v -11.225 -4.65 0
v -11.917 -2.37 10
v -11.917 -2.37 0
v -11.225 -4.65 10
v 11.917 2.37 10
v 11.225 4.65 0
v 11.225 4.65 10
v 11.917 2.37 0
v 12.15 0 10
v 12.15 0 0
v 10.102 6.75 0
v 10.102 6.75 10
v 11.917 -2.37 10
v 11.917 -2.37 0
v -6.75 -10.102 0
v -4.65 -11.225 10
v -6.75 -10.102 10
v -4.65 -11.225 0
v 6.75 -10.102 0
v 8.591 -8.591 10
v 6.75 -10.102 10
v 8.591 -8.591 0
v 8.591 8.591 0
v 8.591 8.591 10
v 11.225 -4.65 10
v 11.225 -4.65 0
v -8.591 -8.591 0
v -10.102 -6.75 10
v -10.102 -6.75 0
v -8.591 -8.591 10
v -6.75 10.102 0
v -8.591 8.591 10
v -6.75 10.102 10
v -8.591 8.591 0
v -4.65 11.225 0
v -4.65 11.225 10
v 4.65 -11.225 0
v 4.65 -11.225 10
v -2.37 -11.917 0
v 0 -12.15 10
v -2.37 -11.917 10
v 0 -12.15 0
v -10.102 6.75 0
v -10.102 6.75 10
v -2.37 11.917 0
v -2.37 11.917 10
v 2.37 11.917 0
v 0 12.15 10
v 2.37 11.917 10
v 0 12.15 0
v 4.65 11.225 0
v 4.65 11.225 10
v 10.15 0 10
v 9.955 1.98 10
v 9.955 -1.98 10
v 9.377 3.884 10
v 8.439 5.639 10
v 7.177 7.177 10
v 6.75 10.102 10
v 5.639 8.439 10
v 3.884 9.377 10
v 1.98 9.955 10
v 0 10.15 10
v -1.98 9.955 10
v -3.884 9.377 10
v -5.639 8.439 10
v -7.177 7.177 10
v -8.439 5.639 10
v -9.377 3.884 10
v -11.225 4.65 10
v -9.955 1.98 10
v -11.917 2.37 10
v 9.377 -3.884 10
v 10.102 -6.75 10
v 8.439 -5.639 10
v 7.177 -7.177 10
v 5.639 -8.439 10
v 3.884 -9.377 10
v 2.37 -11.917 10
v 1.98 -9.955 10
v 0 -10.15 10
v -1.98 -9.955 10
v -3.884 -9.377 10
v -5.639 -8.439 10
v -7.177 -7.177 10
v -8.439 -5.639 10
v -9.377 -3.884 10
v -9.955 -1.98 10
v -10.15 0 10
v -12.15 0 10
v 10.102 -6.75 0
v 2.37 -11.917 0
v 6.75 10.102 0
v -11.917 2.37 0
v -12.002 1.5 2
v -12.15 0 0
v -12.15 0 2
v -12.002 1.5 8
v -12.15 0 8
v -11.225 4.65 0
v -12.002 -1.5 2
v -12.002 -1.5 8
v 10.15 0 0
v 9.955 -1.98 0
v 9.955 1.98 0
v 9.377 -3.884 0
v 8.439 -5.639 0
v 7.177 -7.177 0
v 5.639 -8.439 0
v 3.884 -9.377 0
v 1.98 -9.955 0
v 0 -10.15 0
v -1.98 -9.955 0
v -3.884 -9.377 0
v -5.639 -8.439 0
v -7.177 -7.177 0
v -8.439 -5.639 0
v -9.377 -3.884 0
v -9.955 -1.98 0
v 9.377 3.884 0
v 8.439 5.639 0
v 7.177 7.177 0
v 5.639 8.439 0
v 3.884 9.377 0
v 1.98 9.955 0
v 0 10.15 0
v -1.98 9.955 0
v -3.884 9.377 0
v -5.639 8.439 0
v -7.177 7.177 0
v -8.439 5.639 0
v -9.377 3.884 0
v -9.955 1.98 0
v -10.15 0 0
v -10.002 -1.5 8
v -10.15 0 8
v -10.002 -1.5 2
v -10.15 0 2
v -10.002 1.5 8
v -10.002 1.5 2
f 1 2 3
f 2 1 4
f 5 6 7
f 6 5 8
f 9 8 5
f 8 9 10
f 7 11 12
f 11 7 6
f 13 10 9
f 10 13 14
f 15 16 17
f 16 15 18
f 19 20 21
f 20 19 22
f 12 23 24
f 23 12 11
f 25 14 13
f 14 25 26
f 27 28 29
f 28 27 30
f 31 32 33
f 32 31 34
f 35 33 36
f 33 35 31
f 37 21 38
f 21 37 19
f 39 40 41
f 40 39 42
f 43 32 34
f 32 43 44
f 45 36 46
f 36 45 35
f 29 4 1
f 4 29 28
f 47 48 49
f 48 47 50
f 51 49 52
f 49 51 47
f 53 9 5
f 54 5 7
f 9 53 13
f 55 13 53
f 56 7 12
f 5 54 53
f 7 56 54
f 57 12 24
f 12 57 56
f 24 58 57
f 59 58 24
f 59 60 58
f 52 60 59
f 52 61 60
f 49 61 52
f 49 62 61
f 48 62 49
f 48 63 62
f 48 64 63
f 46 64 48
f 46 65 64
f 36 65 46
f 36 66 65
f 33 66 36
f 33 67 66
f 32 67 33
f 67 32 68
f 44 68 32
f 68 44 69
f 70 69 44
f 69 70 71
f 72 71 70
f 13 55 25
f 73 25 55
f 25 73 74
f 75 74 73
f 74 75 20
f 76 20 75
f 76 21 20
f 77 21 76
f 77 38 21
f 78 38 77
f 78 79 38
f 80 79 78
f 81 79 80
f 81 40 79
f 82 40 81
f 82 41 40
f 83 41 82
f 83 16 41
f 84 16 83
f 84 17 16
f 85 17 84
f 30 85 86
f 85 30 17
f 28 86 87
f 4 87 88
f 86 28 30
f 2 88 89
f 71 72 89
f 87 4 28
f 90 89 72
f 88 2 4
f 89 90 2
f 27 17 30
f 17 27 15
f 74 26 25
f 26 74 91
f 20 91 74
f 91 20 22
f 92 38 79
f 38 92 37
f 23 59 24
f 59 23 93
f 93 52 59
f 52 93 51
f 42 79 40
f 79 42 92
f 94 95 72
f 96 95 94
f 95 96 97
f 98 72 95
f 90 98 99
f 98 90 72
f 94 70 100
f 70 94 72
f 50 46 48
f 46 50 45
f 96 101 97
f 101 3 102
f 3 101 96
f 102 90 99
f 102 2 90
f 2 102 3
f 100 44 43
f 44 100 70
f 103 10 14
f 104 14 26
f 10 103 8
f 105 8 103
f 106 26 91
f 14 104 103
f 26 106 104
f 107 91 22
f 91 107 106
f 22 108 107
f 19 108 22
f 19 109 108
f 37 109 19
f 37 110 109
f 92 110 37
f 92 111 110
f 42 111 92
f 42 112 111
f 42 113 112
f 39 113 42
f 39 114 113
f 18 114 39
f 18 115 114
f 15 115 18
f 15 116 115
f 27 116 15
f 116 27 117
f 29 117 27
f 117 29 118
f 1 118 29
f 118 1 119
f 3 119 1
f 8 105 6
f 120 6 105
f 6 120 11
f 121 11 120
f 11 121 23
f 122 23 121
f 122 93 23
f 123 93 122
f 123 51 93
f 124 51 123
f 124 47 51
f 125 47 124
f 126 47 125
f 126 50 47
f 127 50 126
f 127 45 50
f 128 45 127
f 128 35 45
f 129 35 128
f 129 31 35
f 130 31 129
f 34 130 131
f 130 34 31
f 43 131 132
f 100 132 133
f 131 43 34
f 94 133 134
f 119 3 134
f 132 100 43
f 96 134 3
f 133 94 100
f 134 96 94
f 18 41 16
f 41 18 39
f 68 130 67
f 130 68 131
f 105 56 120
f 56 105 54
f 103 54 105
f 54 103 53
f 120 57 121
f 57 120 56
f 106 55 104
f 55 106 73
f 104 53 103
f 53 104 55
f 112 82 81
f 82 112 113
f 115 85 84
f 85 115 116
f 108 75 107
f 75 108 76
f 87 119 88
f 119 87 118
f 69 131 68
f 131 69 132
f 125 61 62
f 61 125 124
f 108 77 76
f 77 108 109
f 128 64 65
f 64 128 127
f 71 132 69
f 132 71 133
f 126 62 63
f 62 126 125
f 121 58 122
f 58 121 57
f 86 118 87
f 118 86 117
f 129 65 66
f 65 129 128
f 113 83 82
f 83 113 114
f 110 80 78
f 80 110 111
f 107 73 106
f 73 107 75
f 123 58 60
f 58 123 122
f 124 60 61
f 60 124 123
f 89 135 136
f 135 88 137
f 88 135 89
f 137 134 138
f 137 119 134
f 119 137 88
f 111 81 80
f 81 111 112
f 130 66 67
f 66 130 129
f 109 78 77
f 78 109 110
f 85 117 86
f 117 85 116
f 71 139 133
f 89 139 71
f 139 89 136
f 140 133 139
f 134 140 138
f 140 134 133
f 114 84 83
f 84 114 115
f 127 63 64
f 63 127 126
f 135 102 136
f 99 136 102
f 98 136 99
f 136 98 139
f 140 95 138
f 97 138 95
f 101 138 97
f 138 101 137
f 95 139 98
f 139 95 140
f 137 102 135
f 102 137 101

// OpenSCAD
$fn = 32;

// ----------------------------------------------------------------------
// Spacer sleeve: 24.3 / 20.3 x 10 mm
// ----------------------------------------------------------------------

// --- parameters (mm) ---
sleeve_od = 24.3;         // outside diameter
sleeve_id = 20.3;         // shaft bore
sleeve_l = 10;            // sleeve length
slot_w = 3;               // clamp slot width
slot_len = 6;             // clamp slot length

module sleeve() {
  cylinder(h = sleeve_l, d = sleeve_od);
}

difference() {
  sleeve();
  translate([0, 0, -1]) cylinder(h = sleeve_l + 2, d = sleeve_id);
  translate([-sleeve_od / 2 - 1, -slot_w / 2, sleeve_l / 2 - slot_len / 2]) cube([sleeve_od / 2 + 1, slot_w, slot_len]);
}
